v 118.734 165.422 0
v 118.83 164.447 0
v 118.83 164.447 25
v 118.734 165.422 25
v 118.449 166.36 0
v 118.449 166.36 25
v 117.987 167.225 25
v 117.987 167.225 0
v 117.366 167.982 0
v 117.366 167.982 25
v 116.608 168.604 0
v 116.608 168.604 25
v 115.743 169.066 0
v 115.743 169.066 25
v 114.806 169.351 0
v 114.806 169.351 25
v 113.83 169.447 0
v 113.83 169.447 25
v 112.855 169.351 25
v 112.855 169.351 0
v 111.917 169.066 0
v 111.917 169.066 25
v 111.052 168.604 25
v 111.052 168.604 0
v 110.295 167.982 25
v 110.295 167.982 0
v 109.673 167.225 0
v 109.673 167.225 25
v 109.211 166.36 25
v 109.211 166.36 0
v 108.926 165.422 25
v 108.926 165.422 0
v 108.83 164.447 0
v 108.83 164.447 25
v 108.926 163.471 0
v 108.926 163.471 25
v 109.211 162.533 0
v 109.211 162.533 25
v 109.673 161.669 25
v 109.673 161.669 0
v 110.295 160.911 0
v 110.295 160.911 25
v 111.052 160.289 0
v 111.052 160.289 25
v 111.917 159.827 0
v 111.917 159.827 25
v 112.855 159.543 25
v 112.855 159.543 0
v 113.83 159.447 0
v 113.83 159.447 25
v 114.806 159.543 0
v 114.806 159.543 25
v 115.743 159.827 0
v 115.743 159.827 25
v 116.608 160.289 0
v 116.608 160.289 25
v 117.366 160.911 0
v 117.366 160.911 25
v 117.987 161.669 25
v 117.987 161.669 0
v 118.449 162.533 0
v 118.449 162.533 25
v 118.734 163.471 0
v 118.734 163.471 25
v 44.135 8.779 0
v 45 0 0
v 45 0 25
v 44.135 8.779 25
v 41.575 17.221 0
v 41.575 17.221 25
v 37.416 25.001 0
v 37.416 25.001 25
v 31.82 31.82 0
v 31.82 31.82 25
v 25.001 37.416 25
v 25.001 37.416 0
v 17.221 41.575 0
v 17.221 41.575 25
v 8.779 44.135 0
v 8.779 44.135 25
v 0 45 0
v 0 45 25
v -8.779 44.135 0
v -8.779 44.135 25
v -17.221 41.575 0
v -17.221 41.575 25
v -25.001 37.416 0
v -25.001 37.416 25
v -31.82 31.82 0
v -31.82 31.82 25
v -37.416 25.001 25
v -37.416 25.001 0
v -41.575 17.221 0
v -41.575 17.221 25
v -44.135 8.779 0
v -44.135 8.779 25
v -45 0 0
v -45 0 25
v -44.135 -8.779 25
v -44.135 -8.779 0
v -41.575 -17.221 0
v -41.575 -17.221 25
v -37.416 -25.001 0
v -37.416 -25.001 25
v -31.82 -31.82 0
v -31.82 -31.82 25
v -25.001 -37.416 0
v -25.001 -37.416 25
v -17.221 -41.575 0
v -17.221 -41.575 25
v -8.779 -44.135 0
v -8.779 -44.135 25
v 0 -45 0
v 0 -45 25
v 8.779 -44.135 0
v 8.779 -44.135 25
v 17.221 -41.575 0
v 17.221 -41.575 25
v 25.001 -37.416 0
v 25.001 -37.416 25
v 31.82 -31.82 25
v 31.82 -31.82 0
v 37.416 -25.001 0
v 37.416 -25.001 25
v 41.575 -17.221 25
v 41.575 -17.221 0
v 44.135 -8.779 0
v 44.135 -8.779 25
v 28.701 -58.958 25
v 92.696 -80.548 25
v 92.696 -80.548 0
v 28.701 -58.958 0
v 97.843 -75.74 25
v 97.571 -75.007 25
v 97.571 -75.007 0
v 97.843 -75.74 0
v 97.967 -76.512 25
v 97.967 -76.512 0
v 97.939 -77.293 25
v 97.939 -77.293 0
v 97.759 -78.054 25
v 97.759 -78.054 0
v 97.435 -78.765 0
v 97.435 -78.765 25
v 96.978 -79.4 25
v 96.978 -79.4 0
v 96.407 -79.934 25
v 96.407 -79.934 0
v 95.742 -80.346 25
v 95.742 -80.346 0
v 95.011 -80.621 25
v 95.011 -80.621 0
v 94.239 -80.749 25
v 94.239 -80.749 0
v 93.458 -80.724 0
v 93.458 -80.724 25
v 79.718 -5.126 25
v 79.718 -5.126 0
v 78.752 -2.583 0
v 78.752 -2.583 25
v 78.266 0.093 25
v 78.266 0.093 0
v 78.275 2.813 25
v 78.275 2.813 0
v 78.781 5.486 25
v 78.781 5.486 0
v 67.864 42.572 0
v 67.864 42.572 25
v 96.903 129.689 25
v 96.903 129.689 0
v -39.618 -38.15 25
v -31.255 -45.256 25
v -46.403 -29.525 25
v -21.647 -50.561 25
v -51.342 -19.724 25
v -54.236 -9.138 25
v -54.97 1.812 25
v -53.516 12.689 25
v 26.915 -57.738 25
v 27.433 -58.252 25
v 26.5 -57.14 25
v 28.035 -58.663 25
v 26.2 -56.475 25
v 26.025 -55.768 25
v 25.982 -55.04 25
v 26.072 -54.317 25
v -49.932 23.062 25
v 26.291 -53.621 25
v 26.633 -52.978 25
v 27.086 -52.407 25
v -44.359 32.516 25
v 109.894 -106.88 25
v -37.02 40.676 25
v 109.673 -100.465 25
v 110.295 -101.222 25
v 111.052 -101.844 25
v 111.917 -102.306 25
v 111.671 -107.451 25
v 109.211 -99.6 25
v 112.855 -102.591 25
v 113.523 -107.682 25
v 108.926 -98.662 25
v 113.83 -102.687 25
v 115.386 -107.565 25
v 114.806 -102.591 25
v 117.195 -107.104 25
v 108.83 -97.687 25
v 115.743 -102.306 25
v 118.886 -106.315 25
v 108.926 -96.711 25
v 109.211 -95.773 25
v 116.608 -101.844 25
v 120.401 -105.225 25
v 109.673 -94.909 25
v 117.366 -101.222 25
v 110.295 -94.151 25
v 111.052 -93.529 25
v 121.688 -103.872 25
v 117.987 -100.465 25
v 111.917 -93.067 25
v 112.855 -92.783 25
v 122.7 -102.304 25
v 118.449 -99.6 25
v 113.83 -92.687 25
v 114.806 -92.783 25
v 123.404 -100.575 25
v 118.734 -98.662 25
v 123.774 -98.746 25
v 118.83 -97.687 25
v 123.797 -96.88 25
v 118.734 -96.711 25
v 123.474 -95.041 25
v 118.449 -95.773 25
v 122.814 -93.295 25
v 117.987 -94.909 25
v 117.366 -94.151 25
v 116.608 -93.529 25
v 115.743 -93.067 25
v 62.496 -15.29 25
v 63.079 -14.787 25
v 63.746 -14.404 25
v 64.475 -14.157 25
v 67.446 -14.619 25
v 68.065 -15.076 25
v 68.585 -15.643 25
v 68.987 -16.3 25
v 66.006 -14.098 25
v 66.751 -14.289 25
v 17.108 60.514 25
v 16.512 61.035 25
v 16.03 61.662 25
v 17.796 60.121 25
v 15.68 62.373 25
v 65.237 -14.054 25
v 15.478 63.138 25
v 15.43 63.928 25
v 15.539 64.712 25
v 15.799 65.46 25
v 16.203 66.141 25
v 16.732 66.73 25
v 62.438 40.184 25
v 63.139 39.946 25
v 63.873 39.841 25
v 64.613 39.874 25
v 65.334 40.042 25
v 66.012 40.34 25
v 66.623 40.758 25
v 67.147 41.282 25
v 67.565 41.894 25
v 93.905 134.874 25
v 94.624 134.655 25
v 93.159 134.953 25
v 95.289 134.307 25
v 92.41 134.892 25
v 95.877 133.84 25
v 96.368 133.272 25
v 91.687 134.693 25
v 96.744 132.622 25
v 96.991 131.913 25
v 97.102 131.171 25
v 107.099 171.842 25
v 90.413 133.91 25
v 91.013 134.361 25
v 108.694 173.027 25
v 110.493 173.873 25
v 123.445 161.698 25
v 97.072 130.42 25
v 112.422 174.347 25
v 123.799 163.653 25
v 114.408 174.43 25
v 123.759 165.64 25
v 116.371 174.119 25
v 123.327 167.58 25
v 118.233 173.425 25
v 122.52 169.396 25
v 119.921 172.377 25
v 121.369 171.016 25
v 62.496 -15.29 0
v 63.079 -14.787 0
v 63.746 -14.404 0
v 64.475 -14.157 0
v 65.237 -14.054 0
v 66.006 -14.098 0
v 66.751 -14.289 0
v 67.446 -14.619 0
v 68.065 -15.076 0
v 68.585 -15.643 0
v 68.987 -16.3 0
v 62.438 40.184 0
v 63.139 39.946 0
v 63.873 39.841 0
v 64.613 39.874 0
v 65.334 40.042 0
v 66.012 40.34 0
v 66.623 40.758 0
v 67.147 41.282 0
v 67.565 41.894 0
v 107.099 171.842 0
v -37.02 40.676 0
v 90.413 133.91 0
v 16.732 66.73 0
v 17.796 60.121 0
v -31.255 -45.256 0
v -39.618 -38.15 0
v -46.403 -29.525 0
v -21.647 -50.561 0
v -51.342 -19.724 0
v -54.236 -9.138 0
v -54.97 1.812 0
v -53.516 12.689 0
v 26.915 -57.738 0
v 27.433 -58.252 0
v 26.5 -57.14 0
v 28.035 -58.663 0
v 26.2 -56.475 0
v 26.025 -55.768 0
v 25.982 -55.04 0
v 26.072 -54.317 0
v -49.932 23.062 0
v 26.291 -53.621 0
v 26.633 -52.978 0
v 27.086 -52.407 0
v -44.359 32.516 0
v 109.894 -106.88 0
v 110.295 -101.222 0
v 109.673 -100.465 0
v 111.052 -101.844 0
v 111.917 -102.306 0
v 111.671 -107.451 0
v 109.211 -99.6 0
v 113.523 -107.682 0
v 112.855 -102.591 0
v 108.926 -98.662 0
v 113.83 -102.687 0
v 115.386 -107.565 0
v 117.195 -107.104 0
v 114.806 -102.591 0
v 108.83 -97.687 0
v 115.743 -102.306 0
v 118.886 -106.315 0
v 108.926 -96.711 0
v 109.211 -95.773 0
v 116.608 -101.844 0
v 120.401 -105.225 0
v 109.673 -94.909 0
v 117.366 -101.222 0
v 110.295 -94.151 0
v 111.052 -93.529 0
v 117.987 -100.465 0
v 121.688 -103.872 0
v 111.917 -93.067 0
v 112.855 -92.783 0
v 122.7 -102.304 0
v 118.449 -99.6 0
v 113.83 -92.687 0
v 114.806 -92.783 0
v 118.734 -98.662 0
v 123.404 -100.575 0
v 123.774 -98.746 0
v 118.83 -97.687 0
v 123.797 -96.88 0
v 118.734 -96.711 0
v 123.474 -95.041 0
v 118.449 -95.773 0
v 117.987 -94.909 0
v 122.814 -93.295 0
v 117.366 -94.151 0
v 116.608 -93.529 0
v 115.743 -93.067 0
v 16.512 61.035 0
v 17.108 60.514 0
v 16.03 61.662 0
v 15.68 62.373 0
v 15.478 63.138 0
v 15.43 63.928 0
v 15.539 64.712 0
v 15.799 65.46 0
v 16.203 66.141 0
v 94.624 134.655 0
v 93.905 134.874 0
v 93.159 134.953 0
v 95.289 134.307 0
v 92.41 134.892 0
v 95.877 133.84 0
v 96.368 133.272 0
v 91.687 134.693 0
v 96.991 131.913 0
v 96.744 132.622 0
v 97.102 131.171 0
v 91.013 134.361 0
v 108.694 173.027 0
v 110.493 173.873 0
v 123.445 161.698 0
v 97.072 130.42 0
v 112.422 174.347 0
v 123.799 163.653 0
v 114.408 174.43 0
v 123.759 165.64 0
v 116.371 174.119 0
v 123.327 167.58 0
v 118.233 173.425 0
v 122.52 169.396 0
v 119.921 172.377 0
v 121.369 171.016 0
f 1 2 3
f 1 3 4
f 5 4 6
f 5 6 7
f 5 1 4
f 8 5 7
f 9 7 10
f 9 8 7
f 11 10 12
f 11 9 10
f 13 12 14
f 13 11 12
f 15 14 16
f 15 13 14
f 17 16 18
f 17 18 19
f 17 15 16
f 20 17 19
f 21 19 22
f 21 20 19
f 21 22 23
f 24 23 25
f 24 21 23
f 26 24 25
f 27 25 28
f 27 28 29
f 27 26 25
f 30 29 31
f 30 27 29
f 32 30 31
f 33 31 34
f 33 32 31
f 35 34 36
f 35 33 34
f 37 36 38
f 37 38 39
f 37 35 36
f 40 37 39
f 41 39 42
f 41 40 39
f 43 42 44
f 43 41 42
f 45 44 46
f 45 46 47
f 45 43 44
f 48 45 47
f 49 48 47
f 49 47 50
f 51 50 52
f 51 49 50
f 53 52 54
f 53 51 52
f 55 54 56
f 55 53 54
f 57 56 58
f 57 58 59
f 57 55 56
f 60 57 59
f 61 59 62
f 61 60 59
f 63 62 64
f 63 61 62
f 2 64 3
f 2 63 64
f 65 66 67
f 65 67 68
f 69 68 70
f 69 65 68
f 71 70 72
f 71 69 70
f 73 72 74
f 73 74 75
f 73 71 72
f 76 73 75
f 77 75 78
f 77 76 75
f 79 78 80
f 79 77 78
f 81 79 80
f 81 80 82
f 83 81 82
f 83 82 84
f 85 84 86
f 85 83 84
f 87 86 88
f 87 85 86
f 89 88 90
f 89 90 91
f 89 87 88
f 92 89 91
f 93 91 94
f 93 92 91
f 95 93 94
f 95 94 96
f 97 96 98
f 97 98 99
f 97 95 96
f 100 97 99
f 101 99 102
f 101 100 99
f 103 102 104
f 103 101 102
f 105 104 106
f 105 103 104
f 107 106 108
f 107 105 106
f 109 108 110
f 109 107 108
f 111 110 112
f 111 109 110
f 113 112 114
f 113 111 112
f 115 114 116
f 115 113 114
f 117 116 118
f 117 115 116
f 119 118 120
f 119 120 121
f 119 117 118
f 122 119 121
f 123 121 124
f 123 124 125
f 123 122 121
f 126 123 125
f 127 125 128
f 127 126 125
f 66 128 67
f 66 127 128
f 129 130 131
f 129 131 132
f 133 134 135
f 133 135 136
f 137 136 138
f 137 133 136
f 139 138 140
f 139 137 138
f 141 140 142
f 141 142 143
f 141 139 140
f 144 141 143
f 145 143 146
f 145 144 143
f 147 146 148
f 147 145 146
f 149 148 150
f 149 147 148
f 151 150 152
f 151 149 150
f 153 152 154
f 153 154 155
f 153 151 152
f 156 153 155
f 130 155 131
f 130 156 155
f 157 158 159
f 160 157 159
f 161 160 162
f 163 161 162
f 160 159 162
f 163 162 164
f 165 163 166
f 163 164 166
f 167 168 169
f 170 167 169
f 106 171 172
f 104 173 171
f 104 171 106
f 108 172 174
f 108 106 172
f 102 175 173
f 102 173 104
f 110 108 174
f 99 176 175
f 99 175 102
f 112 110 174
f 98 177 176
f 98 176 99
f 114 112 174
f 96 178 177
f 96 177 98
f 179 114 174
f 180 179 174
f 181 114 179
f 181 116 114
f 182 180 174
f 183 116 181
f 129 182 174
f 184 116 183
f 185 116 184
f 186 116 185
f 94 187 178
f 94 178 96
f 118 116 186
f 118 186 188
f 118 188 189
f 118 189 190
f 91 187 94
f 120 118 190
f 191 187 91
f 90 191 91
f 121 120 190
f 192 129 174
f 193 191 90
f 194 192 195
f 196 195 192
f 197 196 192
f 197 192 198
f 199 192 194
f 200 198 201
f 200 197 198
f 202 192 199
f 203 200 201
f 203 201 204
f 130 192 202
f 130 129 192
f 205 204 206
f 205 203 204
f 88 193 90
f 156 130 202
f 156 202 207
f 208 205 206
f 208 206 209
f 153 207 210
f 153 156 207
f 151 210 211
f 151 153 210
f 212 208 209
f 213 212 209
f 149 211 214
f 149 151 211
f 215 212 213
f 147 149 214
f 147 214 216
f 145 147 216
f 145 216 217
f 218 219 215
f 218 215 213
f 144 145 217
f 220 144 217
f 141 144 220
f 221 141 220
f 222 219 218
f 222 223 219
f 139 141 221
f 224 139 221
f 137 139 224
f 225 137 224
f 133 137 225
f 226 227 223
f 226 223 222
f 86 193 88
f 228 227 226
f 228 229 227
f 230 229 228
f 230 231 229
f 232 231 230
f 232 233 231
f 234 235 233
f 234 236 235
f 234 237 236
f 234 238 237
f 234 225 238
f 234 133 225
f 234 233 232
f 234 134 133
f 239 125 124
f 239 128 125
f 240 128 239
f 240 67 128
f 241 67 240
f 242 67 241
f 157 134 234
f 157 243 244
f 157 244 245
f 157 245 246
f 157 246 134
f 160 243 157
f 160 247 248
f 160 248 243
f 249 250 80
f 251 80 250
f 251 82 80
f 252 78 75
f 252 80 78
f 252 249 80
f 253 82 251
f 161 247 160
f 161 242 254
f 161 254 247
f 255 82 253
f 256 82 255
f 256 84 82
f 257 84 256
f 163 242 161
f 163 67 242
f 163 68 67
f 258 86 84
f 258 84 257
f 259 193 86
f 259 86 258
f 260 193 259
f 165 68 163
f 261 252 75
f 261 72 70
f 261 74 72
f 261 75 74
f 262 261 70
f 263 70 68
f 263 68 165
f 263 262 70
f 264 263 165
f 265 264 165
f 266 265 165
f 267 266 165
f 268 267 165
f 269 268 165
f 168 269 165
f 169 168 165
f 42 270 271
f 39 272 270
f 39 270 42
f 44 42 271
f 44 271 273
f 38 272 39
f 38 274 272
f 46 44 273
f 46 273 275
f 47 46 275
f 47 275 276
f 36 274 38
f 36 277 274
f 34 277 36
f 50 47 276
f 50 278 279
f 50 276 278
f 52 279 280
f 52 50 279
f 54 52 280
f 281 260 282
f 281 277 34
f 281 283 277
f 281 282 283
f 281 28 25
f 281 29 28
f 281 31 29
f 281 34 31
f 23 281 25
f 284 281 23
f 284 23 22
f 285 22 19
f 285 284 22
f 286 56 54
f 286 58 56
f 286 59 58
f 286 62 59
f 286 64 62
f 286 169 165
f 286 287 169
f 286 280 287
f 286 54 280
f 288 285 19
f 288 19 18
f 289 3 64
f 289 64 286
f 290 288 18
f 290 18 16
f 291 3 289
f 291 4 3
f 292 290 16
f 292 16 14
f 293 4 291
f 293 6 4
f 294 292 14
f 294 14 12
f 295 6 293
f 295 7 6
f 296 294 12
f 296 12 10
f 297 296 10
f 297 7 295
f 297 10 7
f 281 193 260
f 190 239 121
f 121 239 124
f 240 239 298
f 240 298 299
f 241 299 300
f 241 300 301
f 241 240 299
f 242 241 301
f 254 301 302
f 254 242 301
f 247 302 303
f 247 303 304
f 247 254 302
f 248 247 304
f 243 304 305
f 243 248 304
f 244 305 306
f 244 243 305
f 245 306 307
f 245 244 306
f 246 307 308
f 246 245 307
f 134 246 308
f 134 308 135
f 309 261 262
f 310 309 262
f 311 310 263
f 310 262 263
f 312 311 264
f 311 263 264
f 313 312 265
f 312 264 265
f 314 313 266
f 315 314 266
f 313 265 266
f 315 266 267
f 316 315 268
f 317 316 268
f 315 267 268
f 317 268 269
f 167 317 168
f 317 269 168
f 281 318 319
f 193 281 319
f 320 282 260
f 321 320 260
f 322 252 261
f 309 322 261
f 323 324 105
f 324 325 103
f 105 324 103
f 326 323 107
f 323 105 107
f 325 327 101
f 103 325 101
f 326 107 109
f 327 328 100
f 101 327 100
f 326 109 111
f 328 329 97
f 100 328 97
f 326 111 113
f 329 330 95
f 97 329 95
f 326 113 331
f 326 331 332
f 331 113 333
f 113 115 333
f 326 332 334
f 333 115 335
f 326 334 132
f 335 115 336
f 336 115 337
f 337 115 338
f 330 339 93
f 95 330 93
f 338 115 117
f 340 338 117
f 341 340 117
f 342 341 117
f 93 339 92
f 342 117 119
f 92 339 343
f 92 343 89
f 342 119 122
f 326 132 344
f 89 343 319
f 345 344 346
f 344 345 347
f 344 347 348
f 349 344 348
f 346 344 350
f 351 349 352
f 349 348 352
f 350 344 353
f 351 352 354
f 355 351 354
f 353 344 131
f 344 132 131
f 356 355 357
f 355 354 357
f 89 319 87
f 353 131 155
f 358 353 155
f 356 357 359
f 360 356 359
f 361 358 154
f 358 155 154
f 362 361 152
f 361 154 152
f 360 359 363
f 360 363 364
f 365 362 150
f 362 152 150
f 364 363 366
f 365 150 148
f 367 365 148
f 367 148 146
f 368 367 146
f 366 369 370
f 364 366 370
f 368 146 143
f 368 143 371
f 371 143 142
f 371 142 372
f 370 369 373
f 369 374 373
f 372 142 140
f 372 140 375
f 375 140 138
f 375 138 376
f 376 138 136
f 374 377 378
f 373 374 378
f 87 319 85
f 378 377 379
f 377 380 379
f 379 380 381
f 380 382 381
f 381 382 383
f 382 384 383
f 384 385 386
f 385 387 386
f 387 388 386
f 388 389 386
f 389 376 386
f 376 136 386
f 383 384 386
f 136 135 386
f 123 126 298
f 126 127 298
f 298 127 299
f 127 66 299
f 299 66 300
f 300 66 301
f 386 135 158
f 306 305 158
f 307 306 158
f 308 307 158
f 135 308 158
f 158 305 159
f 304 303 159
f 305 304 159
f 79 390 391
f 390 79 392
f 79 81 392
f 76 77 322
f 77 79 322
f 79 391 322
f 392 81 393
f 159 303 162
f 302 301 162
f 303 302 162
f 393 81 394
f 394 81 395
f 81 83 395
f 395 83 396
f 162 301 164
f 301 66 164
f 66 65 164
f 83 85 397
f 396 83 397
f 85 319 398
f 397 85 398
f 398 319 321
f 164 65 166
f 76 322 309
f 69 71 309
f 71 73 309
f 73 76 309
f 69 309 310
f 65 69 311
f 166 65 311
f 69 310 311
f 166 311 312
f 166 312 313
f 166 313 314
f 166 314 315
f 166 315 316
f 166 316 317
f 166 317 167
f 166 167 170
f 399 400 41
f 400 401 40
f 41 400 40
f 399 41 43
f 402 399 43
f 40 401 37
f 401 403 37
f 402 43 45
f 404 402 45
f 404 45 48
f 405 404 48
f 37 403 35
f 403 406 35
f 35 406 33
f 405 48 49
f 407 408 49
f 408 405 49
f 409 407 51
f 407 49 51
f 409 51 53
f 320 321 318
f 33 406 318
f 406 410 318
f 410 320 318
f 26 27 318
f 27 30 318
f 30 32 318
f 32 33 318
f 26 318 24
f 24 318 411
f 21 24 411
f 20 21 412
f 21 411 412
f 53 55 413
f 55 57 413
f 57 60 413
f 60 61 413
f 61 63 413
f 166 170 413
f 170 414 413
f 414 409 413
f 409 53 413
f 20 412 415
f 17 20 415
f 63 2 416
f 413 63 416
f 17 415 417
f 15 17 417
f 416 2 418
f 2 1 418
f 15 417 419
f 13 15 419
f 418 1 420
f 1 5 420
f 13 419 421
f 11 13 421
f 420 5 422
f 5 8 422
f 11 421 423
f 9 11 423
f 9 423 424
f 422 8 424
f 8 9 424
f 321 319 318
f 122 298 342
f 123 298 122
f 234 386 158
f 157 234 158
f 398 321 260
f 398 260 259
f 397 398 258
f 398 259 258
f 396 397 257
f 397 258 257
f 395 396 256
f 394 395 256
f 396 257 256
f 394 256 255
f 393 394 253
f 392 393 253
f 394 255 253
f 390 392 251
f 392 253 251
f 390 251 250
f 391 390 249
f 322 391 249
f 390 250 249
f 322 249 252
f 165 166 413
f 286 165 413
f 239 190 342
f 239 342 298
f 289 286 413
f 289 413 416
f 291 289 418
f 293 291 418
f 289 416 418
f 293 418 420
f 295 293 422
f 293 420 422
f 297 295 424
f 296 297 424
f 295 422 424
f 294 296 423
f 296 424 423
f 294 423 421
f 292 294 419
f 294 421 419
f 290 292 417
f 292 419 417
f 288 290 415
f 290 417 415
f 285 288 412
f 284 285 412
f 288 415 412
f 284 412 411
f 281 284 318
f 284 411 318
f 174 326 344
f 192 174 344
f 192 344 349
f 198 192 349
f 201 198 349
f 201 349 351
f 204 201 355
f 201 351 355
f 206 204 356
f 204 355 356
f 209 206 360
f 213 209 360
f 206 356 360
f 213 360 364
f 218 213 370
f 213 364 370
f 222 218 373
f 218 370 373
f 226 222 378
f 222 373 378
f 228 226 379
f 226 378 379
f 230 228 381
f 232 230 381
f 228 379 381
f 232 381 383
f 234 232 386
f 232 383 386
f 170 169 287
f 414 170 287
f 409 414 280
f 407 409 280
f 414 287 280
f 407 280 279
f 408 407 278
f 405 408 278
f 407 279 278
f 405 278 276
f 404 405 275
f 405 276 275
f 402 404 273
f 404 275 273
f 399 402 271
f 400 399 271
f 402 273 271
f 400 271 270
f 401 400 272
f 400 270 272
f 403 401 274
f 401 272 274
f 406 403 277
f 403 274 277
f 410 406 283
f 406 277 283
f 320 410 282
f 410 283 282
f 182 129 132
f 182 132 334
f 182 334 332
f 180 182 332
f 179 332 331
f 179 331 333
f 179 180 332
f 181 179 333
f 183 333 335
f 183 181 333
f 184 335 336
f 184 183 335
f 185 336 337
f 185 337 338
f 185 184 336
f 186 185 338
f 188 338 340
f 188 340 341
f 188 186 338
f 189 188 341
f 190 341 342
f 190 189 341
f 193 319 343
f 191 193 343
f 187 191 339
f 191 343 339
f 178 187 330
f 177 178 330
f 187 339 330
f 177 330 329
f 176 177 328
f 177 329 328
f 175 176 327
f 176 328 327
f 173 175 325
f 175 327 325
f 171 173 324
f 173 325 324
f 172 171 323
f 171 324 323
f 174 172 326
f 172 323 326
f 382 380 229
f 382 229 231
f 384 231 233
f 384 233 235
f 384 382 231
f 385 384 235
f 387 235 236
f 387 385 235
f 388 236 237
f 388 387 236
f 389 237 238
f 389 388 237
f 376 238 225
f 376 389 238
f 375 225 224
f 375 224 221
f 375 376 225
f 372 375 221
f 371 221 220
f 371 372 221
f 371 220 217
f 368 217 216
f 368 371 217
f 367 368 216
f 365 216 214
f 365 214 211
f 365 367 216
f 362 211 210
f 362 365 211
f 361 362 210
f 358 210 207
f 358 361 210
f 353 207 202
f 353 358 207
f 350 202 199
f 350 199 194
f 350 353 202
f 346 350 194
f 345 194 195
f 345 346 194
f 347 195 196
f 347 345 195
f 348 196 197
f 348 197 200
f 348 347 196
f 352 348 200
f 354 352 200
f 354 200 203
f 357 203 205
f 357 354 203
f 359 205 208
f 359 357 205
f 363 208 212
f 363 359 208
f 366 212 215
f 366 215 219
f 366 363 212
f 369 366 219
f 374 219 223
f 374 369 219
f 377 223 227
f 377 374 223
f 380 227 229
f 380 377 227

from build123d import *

# Parameters (mm, degrees)
SKETCH2_R           = 45
SKETCH2_R_2         = 5
BOSS_EXTRUDE2_DEPTH = 25
CUT_EXTRUDE1_DEPTH  = 25


with BuildPart() as part:
    # Sketch2 → Boss-Extrude2 (new body)
    with BuildSketch(Plane.XY):
        with BuildLine():
            Line((107.0991595, 171.84228244), (-37.020034505, 40.675755006))
            ThreePointArc((-37.020034505, 40.675755006), (-54.235521991, -9.138279618), (-21.647362352, -50.560772375))
            Line((-21.647362352, -50.560772375), (109.894190801, -106.879683889))
            ThreePointArc((109.894190801, -106.879683889), (121.07607209, -104.578515845), (122.814256533, -93.295406417))
            Line((122.814256533, -93.295406417), (79.717724854, -5.126210099))
            ThreePointArc((79.717724854, -5.126210099), (78.265617309, 0.093033065), (78.780622712, 5.485980771))
            Line((78.780622712, 5.485980771), (123.44478962, 161.697643481))
            ThreePointArc((123.44478962, 161.697643481), (119.103356541, 172.943307617), (107.0991595, 171.84228244))
        make_face()
        Circle(SKETCH2_R, mode=Mode.SUBTRACT)
        with Locations((113.830074865, -97.686816185)):
            Circle(SKETCH2_R_2, mode=Mode.SUBTRACT)
        with Locations((113.830074865, 164.446690621)):
            Circle(SKETCH2_R_2, mode=Mode.SUBTRACT)
    extrude(amount=BOSS_EXTRUDE2_DEPTH)

    # Sketch3 → Cut-Extrude1 (cut)
    with BuildSketch(Plane.XY.offset(25)):
        with BuildLine():
            Line((17.795721205, 60.121434904), (62.437923836, 40.184140526))
            ThreePointArc((62.437923836, 40.184140526), (65.680023373, 40.175202237), (67.86378835, 42.571545249))
            Line((67.86378835, 42.571545249), (96.902891032, 129.688853296))
            ThreePointArc((96.902891032, 129.688853296), (95.288982132, 134.306972586), (90.41314241, 133.909587735))
            Line((90.41314241, 133.909587735), (16.731837096, 66.729574067))
            ThreePointArc((16.731837096, 66.729574067), (15.477705501, 63.137953736), (17.795721205, 60.121434904))
        make_face()
        with BuildLine():
            Line((27.085895713, -52.406577788), (62.496309368, -15.289638174))
            ThreePointArc((62.496309368, -15.289638174), (66.005561811, -14.098322429), (68.98684583, -16.2996928))
            Line((68.98684583, -16.2996928), (97.571155647, -75.006771443))
            ThreePointArc((97.571155647, -75.006771443), (96.977969452, -79.399977656), (92.696111536, -80.547942587))
            Line((92.696111536, -80.547942587), (28.701388064, -58.957803557))
            ThreePointArc((28.701388064, -58.957803557), (26.096410491, -56.125376983), (27.085895713, -52.406577788))
        make_face()
    extrude(amount=-CUT_EXTRUDE1_DEPTH, mode=Mode.SUBTRACT)


solid = part.part
